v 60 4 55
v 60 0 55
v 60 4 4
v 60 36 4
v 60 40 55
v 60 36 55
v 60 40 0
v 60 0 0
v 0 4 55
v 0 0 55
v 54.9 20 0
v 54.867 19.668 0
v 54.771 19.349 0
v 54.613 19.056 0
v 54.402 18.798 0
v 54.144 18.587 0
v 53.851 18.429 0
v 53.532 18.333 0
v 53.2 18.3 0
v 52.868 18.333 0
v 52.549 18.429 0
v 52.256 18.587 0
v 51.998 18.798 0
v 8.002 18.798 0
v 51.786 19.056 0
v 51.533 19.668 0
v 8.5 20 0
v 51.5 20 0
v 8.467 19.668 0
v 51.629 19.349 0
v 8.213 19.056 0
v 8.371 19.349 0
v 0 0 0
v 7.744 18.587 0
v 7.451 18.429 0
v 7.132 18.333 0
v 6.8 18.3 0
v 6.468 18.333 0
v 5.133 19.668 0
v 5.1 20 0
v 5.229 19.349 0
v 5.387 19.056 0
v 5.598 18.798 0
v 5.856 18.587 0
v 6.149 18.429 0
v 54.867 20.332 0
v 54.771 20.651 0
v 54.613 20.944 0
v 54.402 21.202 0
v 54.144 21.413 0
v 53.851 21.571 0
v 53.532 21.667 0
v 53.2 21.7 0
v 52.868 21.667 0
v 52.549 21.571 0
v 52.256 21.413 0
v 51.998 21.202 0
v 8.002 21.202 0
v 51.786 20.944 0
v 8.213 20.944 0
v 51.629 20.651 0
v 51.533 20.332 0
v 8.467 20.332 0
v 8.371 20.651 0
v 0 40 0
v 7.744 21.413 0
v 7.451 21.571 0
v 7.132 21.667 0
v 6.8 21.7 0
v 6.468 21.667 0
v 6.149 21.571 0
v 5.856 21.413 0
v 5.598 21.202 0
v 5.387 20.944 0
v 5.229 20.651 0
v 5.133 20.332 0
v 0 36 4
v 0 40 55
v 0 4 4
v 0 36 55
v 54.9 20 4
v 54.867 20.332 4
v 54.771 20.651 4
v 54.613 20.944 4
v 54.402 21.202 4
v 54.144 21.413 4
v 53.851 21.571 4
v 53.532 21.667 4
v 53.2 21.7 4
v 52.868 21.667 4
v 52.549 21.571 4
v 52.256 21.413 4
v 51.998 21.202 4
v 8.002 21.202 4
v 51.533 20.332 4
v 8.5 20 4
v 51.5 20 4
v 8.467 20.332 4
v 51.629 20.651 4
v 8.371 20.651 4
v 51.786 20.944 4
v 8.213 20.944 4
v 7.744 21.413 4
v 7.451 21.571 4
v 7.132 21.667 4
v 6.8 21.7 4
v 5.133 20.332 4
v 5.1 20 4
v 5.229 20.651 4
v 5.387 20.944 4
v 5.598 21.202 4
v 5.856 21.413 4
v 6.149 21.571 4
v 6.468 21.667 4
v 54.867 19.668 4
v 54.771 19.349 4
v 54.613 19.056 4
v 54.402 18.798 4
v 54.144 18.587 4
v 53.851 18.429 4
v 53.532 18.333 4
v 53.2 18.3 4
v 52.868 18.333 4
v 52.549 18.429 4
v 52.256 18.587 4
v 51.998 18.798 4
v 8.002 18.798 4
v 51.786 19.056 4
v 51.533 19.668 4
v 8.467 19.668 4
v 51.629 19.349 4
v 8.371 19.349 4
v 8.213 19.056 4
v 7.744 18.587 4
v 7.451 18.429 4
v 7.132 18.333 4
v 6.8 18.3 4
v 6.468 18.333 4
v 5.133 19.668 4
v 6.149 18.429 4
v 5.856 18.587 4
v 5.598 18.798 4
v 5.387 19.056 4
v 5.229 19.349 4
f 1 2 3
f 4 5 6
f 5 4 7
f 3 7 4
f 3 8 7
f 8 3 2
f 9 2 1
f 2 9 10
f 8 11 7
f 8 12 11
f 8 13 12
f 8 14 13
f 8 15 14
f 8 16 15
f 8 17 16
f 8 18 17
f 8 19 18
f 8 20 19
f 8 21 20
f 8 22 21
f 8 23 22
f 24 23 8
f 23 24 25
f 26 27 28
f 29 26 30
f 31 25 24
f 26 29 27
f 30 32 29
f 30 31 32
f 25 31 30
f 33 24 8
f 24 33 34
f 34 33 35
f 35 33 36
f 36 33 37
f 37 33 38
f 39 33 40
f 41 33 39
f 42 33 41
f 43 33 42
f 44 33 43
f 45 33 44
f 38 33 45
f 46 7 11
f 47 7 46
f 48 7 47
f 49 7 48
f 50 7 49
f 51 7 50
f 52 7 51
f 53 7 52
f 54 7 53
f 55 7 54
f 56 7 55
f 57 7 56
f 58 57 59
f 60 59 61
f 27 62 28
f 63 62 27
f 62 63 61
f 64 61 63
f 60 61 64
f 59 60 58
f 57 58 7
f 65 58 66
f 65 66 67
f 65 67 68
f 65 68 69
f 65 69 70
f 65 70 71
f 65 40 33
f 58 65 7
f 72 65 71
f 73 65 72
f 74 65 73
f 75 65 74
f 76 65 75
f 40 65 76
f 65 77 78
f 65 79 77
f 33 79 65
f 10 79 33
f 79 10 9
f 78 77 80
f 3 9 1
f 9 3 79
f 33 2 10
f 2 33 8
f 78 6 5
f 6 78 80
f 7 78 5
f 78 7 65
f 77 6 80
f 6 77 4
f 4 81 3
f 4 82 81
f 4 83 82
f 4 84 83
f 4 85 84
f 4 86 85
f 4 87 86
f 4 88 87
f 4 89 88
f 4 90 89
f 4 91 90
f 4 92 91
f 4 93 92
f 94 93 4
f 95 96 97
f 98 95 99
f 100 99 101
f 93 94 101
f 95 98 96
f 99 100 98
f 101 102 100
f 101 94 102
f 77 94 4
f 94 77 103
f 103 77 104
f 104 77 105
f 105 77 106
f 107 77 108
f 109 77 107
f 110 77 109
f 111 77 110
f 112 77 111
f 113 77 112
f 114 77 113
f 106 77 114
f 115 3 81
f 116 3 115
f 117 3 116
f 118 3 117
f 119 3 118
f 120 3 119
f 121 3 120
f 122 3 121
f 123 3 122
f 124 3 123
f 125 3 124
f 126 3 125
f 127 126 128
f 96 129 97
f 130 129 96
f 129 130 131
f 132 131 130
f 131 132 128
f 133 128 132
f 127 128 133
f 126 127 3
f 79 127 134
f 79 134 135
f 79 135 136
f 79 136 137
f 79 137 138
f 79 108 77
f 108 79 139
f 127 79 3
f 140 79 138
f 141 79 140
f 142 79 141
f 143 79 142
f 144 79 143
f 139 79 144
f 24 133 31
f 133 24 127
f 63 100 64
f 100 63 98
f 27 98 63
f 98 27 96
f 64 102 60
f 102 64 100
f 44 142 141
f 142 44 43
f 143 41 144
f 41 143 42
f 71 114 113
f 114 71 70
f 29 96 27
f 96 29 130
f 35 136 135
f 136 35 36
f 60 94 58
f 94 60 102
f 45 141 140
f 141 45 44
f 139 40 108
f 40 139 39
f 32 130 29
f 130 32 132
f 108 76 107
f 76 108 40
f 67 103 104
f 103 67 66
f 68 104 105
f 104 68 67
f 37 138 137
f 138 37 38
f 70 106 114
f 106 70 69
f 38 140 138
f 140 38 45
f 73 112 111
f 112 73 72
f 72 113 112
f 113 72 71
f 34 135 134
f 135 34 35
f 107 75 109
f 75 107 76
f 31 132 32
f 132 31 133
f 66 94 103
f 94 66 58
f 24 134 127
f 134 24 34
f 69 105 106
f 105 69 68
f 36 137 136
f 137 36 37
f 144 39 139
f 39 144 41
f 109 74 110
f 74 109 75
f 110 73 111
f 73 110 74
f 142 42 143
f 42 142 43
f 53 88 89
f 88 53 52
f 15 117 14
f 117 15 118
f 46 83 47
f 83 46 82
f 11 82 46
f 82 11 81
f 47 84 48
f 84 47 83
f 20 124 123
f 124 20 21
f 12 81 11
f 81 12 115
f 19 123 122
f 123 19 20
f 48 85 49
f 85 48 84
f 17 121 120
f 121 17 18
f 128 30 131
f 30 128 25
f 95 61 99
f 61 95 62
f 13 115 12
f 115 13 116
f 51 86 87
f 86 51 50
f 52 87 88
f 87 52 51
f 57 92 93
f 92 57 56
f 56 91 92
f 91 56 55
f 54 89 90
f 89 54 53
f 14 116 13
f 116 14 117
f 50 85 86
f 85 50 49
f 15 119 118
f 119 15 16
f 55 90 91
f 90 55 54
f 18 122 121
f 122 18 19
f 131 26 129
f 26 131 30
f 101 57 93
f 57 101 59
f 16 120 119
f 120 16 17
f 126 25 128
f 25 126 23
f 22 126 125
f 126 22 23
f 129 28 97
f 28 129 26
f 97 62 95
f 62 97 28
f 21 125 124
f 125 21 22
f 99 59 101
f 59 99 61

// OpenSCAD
$fn = 32;

// ----------------------------------------------------------------------
// U-bracket: 60 x 40 x 55 mm
// ----------------------------------------------------------------------

// --- parameters (mm) ---
length = 60;              // outer length, X
width = 40;               // outer width, Y
height = 55;              // upright height, Z
thick = 4;                // wall thickness
hole_d = 3.4;             // clearance for M3

module hole_z(px, py) {
  translate([px, py, -0.5]) cylinder(h = thick + 1, d = hole_d);
}
module hole_y_pz(pz) {
  /* through both uprights along Y */
  translate([0, -0.5, pz]) rotate([-90, 0, 0]) cylinder(h = width + 1, d = hole_d);
}

module base() {
  cube([length, width, thick]);
}

module uprights() {
  cube([length, thick, height]);
  translate([0, width - thick, 0]) cube([length, thick, height]);
}

difference() {
  union() {
    base();
    uprights();
  }
  hole_z(6.8, 20);
  hole_z(53.2, 20);
}
